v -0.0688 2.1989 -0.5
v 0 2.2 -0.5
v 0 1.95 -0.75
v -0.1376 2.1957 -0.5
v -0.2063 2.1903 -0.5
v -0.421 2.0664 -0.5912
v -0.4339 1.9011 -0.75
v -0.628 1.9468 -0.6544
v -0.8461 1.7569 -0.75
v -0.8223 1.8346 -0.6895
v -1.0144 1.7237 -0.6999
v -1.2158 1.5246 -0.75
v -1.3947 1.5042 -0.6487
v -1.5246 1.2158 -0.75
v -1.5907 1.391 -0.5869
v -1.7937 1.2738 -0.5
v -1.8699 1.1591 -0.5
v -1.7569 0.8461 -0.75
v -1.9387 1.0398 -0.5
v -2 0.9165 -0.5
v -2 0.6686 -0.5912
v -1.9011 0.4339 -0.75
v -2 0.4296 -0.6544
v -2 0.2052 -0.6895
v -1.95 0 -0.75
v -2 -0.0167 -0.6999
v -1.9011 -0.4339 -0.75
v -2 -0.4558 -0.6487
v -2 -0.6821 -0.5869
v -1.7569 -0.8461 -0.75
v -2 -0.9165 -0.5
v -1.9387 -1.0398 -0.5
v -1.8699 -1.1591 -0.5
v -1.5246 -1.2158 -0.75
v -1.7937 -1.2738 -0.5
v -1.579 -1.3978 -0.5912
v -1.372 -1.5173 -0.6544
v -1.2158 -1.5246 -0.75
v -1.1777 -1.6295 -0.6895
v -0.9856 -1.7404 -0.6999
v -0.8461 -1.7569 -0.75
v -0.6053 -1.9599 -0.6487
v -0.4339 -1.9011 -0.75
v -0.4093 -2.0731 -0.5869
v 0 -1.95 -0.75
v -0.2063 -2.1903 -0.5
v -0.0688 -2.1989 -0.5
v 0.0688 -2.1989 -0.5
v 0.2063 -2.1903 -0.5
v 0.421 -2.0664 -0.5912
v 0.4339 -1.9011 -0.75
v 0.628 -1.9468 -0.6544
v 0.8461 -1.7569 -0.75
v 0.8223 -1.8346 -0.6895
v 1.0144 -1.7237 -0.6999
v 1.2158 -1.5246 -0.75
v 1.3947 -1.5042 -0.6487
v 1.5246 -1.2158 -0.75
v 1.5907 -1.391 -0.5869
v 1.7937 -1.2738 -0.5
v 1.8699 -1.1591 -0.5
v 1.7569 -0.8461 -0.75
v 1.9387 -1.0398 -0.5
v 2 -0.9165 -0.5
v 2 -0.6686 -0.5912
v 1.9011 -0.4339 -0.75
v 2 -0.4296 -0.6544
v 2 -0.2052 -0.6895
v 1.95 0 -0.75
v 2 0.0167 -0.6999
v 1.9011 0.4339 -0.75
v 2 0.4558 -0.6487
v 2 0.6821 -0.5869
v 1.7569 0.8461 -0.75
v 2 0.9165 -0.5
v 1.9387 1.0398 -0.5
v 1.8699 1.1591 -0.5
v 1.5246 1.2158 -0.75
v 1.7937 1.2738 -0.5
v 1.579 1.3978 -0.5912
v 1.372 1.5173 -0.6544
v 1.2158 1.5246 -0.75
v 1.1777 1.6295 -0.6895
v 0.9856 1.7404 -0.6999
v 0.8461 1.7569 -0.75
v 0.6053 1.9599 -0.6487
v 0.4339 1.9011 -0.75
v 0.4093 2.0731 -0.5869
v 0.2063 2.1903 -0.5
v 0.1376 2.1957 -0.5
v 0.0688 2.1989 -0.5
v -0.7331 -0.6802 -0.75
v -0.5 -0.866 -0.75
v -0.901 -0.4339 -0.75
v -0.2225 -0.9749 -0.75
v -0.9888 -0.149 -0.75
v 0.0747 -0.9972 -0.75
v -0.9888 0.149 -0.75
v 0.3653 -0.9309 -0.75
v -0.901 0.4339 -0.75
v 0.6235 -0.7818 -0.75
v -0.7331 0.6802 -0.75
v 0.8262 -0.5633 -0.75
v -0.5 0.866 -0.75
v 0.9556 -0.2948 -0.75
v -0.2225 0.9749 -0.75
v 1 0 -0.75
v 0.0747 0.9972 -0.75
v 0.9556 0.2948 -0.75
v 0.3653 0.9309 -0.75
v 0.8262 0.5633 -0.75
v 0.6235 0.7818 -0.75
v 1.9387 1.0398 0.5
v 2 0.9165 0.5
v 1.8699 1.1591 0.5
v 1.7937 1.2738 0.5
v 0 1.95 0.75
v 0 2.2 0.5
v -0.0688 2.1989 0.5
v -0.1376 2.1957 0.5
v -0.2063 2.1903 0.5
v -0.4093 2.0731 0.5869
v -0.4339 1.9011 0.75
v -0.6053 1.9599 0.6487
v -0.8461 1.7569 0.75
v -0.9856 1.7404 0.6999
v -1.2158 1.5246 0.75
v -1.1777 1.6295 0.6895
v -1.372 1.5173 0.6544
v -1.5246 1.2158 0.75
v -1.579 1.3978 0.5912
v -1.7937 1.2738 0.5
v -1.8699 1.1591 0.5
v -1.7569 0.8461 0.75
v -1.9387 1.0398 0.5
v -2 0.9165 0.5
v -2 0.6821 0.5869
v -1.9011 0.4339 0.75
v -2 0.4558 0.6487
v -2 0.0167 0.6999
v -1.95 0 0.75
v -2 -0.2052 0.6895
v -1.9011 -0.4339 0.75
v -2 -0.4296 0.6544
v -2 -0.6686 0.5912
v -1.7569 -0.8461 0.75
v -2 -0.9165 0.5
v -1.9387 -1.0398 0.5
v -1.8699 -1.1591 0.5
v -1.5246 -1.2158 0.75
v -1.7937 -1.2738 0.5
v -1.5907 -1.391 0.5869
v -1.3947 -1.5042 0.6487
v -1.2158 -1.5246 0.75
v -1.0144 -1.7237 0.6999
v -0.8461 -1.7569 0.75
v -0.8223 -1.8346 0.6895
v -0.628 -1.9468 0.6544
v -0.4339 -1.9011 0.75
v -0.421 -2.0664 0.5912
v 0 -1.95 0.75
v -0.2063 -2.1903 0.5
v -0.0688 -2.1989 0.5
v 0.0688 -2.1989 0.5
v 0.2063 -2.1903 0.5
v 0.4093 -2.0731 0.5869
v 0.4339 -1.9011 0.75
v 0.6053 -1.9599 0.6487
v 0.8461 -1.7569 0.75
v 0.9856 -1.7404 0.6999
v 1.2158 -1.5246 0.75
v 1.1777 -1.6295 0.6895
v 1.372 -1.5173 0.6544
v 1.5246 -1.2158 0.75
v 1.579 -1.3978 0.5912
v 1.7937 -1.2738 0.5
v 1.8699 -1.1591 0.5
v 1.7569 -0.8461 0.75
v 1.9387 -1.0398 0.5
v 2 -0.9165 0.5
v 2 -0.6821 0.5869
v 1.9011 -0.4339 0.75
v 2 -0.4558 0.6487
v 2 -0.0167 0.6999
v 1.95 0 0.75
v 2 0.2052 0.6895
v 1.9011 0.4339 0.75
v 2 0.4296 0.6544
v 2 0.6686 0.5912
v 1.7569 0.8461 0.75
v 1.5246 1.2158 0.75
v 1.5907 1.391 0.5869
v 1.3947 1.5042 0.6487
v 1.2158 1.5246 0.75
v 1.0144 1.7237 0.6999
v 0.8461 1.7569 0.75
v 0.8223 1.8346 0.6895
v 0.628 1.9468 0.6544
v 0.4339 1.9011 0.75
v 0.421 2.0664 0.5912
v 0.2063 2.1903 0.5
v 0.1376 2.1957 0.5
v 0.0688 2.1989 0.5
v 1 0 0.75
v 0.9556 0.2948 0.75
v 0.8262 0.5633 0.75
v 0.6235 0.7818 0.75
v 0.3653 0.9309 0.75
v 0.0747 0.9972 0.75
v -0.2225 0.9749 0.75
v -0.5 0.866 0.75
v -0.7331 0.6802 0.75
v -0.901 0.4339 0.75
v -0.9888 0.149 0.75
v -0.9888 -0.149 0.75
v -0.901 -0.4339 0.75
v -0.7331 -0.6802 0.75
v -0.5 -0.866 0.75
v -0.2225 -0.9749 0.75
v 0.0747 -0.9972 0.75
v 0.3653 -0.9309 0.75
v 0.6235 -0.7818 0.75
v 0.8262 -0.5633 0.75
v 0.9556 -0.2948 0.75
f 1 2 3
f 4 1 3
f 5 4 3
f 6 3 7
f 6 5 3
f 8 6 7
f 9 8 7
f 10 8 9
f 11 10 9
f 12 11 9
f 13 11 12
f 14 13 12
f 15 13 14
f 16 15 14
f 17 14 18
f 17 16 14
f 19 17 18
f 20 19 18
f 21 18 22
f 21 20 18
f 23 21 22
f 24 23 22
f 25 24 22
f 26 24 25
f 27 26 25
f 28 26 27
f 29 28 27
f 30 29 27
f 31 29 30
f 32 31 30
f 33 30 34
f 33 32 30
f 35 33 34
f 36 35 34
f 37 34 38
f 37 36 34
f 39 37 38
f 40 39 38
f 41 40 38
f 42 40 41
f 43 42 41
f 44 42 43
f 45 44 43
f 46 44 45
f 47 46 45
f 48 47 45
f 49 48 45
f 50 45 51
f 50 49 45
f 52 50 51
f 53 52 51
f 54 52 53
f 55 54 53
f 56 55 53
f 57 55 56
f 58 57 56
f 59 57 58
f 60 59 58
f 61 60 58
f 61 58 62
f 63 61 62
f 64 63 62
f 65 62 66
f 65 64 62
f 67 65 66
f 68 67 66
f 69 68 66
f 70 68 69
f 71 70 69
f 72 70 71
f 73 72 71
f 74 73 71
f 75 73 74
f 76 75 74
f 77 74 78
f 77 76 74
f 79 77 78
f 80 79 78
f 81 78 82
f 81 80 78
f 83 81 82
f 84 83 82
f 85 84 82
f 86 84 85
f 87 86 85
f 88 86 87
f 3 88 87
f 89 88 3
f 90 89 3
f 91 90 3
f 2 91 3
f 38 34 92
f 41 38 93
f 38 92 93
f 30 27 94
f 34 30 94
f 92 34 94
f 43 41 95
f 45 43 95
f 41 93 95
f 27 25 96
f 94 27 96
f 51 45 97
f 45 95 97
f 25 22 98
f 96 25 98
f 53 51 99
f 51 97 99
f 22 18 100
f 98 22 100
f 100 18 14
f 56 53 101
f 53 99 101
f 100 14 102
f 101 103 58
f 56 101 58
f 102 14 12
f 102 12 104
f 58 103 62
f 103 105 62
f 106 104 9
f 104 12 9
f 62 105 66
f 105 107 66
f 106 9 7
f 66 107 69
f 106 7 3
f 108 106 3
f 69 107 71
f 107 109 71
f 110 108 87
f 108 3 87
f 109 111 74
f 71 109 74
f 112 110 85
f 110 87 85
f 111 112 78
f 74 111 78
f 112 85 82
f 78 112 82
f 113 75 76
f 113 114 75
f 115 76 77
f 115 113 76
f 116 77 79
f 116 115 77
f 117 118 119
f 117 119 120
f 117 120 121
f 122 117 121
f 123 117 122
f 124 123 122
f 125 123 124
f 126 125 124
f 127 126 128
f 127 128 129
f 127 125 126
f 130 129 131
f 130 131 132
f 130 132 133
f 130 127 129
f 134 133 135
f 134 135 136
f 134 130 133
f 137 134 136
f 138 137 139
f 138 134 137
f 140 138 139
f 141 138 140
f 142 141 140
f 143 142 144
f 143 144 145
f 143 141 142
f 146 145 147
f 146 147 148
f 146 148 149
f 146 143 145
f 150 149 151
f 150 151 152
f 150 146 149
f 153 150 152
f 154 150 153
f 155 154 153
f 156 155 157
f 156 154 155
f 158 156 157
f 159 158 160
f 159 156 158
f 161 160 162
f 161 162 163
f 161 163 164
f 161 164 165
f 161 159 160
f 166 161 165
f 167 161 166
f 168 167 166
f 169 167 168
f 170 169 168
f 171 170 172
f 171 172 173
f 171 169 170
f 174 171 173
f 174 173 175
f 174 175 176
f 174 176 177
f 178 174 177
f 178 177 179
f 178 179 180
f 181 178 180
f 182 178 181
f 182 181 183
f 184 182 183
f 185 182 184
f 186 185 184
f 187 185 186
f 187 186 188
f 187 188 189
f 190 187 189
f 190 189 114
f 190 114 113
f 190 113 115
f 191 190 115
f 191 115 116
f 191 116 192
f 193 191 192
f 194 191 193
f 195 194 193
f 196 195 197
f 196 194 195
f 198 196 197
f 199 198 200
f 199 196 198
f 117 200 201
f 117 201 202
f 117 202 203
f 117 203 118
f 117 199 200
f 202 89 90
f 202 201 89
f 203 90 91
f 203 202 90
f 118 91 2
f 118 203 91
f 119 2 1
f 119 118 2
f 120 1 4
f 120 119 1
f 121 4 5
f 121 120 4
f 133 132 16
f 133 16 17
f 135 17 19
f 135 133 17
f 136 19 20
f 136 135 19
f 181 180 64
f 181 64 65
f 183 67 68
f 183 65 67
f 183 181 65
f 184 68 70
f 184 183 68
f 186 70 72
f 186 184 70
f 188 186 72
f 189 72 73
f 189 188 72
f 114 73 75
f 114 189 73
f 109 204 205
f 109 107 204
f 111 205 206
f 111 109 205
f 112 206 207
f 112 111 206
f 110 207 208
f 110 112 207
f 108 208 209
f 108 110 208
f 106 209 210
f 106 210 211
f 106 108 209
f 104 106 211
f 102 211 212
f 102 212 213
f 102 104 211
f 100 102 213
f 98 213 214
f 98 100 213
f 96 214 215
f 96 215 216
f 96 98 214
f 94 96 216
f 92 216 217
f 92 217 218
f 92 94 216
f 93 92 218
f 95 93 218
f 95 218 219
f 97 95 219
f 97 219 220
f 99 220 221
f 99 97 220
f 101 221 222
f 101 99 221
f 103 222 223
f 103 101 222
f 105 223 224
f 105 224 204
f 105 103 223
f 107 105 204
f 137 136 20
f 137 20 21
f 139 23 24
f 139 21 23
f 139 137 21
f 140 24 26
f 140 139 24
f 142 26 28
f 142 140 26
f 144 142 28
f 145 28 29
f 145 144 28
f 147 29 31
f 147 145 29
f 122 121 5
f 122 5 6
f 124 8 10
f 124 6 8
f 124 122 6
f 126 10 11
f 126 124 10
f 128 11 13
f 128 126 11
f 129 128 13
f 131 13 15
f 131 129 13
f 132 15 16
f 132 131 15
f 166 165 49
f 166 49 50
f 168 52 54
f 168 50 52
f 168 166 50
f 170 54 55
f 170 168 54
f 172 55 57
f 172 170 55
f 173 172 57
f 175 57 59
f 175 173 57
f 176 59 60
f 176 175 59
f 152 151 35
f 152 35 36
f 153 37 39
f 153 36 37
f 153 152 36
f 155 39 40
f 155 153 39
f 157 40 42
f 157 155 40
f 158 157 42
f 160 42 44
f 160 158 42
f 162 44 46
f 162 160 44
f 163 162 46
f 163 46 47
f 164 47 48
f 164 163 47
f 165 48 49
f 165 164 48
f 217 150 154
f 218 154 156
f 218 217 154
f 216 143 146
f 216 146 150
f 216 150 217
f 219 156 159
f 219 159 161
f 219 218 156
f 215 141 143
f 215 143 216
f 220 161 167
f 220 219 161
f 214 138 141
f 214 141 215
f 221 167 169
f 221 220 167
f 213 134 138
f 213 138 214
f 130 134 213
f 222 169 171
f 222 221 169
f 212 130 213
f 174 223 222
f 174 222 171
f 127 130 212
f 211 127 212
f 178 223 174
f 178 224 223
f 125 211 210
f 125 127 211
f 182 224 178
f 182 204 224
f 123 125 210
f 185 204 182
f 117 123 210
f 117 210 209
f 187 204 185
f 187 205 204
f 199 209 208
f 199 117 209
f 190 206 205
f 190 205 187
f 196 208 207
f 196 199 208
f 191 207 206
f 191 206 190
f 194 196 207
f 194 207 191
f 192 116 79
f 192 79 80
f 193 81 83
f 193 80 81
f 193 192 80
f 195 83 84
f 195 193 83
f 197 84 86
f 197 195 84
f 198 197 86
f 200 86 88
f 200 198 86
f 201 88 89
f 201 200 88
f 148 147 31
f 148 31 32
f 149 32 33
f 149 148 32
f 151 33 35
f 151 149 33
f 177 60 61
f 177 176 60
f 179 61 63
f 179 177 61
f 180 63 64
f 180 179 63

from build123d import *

# Parameters (mm, degrees)
SKETCH_R  = 1
PAD_DEPTH = 0.75


with BuildPart() as body001:
    # Sketch001 → Revolution (revolve)
    with BuildSketch(Plane.YZ):
        Polygon((2.2, 0.5), (1.7, 1), (2.5, 1), (2.5, -1), (1.7, -1), (2.2, -0.5), align=None)
    revolve(axis=Axis((0, 0, 0), (0, 0, 1)))


with BuildPart() as cut:
    # Sketch → Pad (new body, symmetric)
    with BuildSketch(Plane.XY):
        Polygon((2, 1.154701), (0, 2.309401), (-2, 1.154701), (-2, -1.154701), (0, -2.309401), (2, -1.154701), align=None)
        Circle(SKETCH_R, mode=Mode.SUBTRACT)
    extrude(amount=PAD_DEPTH, both=True)

    # Cut: cut Body001
    add(body001.part, mode=Mode.SUBTRACT)


solid = cut.part
